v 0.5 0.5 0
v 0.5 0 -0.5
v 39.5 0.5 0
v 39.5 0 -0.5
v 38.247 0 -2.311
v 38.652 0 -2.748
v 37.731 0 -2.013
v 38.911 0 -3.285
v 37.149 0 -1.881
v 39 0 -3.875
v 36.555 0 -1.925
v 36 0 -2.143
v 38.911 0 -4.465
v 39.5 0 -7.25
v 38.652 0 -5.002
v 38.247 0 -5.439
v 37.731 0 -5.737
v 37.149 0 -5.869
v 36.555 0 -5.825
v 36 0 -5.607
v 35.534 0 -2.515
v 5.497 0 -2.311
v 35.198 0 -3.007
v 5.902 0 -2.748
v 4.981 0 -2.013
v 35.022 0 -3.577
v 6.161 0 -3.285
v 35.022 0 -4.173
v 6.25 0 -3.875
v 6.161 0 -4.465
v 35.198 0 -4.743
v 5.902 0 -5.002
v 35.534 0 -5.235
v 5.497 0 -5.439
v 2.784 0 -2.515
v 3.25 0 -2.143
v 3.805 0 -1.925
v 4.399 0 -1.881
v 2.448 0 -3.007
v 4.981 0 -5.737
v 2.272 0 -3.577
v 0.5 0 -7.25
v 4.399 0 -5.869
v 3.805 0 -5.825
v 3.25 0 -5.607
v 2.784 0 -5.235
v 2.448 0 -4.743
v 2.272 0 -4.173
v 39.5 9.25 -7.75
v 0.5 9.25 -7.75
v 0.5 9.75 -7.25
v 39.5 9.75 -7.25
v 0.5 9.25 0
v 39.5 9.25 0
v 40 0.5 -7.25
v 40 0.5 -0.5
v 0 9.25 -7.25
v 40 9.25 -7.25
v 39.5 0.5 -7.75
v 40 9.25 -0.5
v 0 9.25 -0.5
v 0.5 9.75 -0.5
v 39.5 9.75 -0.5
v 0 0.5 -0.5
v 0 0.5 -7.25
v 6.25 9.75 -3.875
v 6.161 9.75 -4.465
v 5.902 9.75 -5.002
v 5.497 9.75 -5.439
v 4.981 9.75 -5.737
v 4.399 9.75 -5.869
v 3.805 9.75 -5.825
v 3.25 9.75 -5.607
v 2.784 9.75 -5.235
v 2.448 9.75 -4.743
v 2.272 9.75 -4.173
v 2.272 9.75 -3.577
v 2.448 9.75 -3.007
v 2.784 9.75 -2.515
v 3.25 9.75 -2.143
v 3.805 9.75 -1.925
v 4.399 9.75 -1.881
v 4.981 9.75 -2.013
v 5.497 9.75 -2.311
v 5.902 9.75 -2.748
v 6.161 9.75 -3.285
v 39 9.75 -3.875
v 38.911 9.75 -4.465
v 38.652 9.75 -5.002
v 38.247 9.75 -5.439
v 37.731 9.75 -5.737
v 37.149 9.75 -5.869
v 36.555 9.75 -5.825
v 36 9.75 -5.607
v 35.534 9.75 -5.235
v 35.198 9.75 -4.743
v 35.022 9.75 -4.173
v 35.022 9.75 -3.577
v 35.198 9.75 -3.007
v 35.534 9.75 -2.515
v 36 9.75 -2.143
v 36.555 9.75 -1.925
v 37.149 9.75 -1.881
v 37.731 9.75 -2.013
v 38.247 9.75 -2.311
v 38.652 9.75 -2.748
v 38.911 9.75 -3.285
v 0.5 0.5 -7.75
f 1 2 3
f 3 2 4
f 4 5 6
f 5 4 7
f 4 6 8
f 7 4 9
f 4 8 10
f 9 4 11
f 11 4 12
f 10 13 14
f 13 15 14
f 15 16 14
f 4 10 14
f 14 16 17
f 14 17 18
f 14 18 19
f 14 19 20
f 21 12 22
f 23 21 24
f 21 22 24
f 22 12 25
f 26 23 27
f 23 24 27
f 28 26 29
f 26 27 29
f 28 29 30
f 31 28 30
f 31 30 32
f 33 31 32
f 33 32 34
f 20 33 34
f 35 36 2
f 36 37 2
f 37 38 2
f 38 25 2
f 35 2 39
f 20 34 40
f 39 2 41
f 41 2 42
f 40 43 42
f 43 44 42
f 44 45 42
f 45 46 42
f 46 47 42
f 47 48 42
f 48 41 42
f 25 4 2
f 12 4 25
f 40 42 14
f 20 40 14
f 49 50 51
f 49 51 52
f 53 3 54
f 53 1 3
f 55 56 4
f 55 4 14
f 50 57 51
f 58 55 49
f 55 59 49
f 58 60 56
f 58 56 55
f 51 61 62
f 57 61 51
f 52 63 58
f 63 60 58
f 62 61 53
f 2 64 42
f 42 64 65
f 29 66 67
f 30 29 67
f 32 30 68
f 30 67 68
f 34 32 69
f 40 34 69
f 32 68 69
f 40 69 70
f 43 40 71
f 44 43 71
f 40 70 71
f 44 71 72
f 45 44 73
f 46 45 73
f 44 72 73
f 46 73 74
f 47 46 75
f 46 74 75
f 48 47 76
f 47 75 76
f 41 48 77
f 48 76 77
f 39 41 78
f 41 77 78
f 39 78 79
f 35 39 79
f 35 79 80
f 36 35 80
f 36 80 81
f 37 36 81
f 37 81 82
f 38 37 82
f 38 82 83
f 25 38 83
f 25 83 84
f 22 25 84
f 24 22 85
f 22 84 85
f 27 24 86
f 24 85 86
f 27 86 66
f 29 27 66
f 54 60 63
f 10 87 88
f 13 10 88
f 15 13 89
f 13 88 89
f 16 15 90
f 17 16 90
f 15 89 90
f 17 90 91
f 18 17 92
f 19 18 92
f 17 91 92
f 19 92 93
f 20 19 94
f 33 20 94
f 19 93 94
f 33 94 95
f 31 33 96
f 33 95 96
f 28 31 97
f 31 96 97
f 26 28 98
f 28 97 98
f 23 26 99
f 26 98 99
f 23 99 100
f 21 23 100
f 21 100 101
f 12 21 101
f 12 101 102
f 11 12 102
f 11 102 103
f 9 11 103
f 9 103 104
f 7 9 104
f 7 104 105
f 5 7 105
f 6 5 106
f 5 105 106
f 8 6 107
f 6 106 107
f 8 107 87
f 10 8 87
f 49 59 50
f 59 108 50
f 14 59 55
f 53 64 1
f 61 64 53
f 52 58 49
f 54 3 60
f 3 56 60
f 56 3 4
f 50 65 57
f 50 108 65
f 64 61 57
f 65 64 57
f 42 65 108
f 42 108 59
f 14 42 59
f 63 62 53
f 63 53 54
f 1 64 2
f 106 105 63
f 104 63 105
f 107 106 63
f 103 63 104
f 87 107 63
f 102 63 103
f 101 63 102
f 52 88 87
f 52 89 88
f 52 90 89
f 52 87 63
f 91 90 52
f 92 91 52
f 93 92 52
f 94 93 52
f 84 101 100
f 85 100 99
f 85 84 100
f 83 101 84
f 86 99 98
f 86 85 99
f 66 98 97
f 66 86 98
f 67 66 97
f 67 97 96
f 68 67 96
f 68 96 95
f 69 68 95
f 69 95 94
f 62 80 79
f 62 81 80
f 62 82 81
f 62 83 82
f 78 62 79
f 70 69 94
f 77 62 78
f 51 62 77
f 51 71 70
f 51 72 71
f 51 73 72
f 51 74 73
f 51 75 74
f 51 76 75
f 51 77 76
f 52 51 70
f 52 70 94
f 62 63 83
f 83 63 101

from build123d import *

# Parameters (mm, degrees)
SKETCH1_W           = 7.75
SKETCH1_H           = 9.75
BOSS_EXTRUDE1_DEPTH = 40
SKETCH4_R           = 2
CUT_EXTRUDE3_DEPTH  = 9.75
CHAMFER1_SIZE       = 0.5


with BuildPart() as part:
    # Sketch1 → Boss-Extrude1 (new body)
    with BuildSketch(Plane(origin=(0, 0, 0), x_dir=(0, 0, -1), z_dir=(1, 0, 0))):
        with Locations((3.875, 4.875)):
            Rectangle(SKETCH1_W, SKETCH1_H)
    extrude(amount=BOSS_EXTRUDE1_DEPTH)

    # Sketch4 → Cut-Extrude3 (cut)
    with BuildSketch(Plane(origin=(0, 9.75, 0), x_dir=(1, 0, 0), z_dir=(0, 1, 0))):
        with Locations((4.25, 3.875)):
            Circle(SKETCH4_R)
        with Locations((37, 3.875)):
            Circle(SKETCH4_R)
    extrude(amount=-CUT_EXTRUDE3_DEPTH, mode=Mode.SUBTRACT)

    # Chamfer1
    chamfer1_edges = [part.edges().sort_by_distance(p)[0] for p in [
        (40, 4.875, -7.75),
        (40, 9.75, -3.875),
        (40, 4.875, 0),
        (0, 9.75, -3.875),
        (0, 4.875, -7.75),
        (0, 0, -3.875),
        (0, 4.875, 0),
        (20, 9.75, 0),
        (20, 9.75, -7.75),
        (20, 0, -7.75),
        (20, 0, 0),
        (40, 0, -3.875),
    ]]
    chamfer(chamfer1_edges, length=CHAMFER1_SIZE)


solid = part.part
